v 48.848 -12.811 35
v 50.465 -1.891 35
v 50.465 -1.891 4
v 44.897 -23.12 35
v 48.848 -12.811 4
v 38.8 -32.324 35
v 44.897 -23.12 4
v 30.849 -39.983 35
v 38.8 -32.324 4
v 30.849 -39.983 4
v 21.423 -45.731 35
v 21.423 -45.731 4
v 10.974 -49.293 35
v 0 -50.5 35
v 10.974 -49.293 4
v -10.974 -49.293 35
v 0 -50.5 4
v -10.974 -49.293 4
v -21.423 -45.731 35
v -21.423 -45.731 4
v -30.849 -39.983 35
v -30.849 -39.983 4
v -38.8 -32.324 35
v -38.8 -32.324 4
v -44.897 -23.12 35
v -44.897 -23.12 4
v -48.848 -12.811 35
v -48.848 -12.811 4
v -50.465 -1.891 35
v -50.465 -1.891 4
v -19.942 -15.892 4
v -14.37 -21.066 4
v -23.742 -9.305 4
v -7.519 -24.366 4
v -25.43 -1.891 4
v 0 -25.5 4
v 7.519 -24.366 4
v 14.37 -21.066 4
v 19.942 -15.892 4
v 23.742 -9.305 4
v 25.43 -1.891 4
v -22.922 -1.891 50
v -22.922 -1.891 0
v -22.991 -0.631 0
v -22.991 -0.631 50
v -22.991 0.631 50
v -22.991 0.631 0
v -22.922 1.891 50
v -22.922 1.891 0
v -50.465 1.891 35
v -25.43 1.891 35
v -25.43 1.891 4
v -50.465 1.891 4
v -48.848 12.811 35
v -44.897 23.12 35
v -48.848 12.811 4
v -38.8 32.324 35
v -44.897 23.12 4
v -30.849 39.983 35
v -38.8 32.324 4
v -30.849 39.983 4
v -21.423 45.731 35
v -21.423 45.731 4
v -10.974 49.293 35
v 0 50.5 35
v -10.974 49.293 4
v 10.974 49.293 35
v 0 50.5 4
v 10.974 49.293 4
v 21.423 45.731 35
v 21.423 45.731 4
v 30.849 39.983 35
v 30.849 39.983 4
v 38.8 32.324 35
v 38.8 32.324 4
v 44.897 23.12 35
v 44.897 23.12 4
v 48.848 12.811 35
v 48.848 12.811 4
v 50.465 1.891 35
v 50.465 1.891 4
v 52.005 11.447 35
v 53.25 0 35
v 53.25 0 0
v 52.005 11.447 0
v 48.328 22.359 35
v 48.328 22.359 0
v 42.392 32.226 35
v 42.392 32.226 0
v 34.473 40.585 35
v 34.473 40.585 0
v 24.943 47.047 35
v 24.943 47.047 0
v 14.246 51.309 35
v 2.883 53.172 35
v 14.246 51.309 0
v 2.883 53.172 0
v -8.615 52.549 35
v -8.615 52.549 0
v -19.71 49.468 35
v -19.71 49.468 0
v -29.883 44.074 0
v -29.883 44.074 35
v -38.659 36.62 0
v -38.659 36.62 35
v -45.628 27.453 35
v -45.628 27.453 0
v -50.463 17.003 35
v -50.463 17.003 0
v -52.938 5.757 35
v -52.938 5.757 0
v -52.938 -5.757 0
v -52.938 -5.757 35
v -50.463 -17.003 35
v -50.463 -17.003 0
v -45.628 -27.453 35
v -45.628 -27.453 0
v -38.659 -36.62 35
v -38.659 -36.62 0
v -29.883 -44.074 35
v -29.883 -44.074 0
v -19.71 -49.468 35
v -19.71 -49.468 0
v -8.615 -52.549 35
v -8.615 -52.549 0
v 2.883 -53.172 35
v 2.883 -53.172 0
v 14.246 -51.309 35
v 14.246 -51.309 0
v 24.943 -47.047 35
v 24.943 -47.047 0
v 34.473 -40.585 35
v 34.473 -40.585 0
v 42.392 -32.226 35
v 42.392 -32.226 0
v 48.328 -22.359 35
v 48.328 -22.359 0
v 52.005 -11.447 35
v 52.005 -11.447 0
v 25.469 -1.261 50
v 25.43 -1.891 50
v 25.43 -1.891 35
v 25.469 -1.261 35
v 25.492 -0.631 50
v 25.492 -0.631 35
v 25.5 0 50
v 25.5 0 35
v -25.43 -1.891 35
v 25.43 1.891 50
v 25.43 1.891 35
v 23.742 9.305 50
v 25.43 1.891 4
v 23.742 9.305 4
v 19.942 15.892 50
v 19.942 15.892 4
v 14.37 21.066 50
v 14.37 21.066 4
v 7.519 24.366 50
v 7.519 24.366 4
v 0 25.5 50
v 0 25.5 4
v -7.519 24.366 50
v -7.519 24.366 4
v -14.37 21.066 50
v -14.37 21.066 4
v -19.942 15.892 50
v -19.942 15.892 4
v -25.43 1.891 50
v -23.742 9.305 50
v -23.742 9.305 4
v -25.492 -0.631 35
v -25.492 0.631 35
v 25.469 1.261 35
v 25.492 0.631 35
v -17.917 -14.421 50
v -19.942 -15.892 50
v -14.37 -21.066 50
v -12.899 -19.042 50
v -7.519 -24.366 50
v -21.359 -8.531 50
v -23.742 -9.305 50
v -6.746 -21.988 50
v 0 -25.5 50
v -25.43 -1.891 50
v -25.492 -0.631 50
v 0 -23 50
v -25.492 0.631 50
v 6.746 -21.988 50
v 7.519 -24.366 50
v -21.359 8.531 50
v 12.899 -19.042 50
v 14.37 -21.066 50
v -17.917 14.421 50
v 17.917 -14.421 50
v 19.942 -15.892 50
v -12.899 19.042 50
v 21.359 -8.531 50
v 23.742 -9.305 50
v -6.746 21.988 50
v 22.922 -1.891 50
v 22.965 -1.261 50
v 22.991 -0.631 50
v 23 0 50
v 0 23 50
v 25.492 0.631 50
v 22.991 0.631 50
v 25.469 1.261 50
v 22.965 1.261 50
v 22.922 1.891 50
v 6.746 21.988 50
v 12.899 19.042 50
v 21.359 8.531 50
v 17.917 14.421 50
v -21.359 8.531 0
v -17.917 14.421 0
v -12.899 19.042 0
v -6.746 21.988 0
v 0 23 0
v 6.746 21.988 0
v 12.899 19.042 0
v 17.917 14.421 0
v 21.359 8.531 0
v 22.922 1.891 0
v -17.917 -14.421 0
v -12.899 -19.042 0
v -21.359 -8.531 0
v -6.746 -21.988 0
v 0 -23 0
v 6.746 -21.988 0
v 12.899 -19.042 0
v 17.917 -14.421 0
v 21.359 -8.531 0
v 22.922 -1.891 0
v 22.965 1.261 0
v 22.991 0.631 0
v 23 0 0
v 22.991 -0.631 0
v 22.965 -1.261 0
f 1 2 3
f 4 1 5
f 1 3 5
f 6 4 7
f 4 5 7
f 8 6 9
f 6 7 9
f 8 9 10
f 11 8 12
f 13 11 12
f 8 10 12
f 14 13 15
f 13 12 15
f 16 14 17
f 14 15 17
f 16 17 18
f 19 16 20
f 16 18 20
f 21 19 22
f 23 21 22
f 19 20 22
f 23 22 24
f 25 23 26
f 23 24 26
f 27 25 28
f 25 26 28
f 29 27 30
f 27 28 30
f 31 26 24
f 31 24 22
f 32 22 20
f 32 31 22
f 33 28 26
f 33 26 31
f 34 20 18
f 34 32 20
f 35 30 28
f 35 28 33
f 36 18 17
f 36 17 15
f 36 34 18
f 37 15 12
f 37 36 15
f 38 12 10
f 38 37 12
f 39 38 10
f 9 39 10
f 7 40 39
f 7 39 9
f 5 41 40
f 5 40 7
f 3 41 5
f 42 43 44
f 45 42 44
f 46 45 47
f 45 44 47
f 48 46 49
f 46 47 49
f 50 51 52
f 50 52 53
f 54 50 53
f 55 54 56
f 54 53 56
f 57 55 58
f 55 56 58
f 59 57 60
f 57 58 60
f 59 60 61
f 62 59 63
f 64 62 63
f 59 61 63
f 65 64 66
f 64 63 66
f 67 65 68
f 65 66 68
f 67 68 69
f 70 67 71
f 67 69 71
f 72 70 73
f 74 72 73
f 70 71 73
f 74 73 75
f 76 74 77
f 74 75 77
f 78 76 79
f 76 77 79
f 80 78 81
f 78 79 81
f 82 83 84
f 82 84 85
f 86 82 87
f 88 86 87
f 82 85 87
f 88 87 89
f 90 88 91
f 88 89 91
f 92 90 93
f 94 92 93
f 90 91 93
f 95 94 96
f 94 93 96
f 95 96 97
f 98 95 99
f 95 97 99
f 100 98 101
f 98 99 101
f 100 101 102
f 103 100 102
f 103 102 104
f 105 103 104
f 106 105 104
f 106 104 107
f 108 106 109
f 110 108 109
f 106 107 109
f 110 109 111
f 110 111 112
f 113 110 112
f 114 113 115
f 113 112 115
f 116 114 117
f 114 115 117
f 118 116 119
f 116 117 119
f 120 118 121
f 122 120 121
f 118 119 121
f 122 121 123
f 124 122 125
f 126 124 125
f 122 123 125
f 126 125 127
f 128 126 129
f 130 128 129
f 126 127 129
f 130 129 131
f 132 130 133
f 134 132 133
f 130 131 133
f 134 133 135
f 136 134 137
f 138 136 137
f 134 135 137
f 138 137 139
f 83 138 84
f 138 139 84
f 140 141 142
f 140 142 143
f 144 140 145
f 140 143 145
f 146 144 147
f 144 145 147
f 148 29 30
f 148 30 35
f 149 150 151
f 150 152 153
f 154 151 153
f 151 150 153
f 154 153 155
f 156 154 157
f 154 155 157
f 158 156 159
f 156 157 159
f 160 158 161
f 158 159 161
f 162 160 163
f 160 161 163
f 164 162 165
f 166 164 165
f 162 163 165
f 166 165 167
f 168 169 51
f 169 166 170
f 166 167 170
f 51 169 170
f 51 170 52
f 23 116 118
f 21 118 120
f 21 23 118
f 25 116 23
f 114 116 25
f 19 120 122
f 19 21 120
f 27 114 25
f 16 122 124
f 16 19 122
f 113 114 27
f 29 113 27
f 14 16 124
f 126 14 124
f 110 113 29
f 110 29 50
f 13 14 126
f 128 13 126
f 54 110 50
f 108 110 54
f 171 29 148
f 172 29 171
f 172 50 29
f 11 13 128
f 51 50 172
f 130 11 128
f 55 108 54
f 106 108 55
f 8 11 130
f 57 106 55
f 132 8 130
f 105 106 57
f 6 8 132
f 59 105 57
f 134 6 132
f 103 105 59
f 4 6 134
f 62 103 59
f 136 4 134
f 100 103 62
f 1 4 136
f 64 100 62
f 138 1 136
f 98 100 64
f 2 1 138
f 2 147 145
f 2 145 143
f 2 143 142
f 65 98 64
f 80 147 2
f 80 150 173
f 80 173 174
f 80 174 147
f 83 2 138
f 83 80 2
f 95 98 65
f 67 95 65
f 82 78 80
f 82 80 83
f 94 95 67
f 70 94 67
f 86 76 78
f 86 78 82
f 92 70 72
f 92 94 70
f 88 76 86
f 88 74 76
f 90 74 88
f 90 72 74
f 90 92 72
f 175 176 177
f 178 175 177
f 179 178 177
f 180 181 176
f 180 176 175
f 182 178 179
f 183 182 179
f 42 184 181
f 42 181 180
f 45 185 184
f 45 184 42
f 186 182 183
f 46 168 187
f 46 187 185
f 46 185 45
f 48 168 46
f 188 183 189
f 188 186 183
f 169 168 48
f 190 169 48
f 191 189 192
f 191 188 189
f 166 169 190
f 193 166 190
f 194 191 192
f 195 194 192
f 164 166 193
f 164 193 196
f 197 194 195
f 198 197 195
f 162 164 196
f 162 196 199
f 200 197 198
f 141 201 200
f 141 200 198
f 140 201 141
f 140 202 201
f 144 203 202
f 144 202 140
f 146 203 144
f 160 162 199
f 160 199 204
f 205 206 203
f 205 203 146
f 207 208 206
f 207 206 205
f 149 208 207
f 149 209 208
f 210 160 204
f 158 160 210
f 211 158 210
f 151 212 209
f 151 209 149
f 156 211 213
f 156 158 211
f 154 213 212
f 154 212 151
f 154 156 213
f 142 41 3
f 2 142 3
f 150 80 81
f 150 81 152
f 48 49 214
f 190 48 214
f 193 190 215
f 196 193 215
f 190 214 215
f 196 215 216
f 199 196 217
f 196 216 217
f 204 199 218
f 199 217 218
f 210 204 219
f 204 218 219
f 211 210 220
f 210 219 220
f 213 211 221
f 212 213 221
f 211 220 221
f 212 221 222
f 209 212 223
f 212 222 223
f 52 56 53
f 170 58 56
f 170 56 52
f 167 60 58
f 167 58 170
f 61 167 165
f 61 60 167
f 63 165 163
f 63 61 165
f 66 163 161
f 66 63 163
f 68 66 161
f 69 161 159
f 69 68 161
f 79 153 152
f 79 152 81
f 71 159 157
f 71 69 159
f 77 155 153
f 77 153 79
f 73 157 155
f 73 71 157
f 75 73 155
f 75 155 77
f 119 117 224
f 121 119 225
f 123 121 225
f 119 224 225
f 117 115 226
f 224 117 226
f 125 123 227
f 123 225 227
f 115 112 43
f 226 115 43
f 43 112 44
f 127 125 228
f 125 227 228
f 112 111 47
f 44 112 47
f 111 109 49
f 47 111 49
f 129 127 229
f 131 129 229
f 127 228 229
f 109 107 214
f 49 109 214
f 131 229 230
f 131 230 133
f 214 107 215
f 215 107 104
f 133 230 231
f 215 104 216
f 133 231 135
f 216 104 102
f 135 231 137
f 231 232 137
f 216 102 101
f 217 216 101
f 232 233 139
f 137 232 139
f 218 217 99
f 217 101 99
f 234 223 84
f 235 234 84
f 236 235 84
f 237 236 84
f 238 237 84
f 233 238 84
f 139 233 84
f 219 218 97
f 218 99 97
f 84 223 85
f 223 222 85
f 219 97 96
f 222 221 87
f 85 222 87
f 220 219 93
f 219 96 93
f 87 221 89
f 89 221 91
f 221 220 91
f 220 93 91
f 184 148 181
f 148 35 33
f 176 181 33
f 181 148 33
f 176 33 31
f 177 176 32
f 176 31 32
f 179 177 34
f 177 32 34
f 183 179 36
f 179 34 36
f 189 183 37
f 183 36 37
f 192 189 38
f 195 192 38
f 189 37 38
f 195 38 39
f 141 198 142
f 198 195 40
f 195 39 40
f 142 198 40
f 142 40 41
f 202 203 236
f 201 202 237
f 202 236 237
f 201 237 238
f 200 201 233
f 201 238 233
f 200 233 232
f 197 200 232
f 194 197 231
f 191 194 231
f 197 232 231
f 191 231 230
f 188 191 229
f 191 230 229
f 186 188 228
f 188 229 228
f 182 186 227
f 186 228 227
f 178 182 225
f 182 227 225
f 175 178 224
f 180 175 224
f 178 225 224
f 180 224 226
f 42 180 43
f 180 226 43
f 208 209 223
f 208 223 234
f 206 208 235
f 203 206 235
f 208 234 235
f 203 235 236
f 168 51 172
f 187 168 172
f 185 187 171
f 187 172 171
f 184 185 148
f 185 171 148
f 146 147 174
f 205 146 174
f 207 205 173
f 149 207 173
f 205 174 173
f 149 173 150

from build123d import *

# Parameters (mm, degrees)
F0_R     = 53.25
F1_DEPTH = 35
F2_DEPTH = 4
F3_DEPTH = 50


with BuildPart() as f1:
    # F0 (on Top) → F1 (new body)
    with BuildSketch(Plane.XY):
        Circle(F0_R)
        with BuildLine():
            ThreePointArc((-50.4645979232, 1.8905968509), (0, 50.5), (50.4645979232, 1.8905968509))
            ThreePointArc((50.4645979232, 1.8905968509), (50.4911487051, 0.94546414), (50.5, 0))
            ThreePointArc((50.5, 0), (50.4911487051, -0.94546414), (50.4645979232, -1.8905968509))
            ThreePointArc((50.4645979232, -1.8905968509), (0, -50.5), (-50.4645979232, -1.8905968509))
            ThreePointArc((-50.4645979232, -1.8905968509), (-50.5, 0), (-50.4645979232, 1.8905968509))
        make_face(mode=Mode.SUBTRACT)
        with BuildLine():
            ThreePointArc((-25.4298180007, -1.8905968509), (-25.5, 0), (-25.4298180007, 1.8905968509))
            Line((-25.4298180007, 1.8905968509), (-50.4645979232, 1.8905968509))
            ThreePointArc((-50.4645979232, 1.8905968509), (-50.5, 0), (-50.4645979232, -1.8905968509))
            Line((-50.4645979232, -1.8905968509), (-25.4298180007, -1.8905968509))
        make_face()
        with BuildLine():
            Line((50.4645979232, 1.8905968509), (25.4298180007, 1.8905968509))
            ThreePointArc((25.4298180007, 1.8905968509), (25.4824484598, 0.9459495184), (25.5, 0))
            ThreePointArc((25.5, 0), (25.4824484598, -0.9459495184), (25.4298180007, -1.8905968509))
            Line((25.4298180007, -1.8905968509), (50.4645979232, -1.8905968509))
            ThreePointArc((50.4645979232, -1.8905968509), (50.4911487051, -0.94546414), (50.5, 0))
            ThreePointArc((50.5, 0), (50.4911487051, 0.94546414), (50.4645979232, 1.8905968509))
        make_face()
    extrude(amount=F1_DEPTH)

    # F0 (on Top) → F2 (join)
    with BuildSketch(Plane.XY):
        with BuildLine():
            ThreePointArc((-25.4298180007, 1.8905968509), (0, 25.5), (25.4298180007, 1.8905968509))
            Line((25.4298180007, 1.8905968509), (50.4645979232, 1.8905968509))
            ThreePointArc((50.4645979232, 1.8905968509), (0, 50.5), (-50.4645979232, 1.8905968509))
            Line((-50.4645979232, 1.8905968509), (-25.4298180007, 1.8905968509))
        make_face()
        with BuildLine():
            Line((50.4645979232, -1.8905968509), (25.4298180007, -1.8905968509))
            ThreePointArc((25.4298180007, -1.8905968509), (0, -25.5), (-25.4298180007, -1.8905968509))
            Line((-25.4298180007, -1.8905968509), (-50.4645979232, -1.8905968509))
            ThreePointArc((-50.4645979232, -1.8905968509), (0, -50.5), (50.4645979232, -1.8905968509))
        make_face()
    extrude(amount=F2_DEPTH)

    # F0 (on Top) → F3 (join)
    with BuildSketch(Plane.XY):
        with BuildLine():
            ThreePointArc((-22.9221648966, 1.8905968509), (0, 23), (22.9221648966, 1.8905968509))
            Line((22.9221648966, 1.8905968509), (25.4298180007, 1.8905968509))
            ThreePointArc((25.4298180007, 1.8905968509), (0, 25.5), (-25.4298180007, 1.8905968509))
            Line((-25.4298180007, 1.8905968509), (-22.9221648966, 1.8905968509))
        make_face()
        with BuildLine():
            Line((25.4298180007, -1.8905968509), (22.9221648966, -1.8905968509))
            ThreePointArc((22.9221648966, -1.8905968509), (0, -23), (-22.9221648966, -1.8905968509))
            Line((-22.9221648966, -1.8905968509), (-25.4298180007, -1.8905968509))
            ThreePointArc((-25.4298180007, -1.8905968509), (0, -25.5), (25.4298180007, -1.8905968509))
        make_face()
        with BuildLine():
            ThreePointArc((-22.9221648966, -1.8905968509), (-23, 0), (-22.9221648966, 1.8905968509))
            Line((-22.9221648966, 1.8905968509), (-25.4298180007, 1.8905968509))
            ThreePointArc((-25.4298180007, 1.8905968509), (-25.5, 0), (-25.4298180007, -1.8905968509))
            Line((-25.4298180007, -1.8905968509), (-22.9221648966, -1.8905968509))
        make_face()
        with BuildLine():
            ThreePointArc((22.9221648966, 1.8905968509), (22.9805329858, 0.9460991962), (23, 0))
            ThreePointArc((23, 0), (22.9805329858, -0.9460991962), (22.9221648966, -1.8905968509))
            Line((22.9221648966, -1.8905968509), (25.4298180007, -1.8905968509))
            ThreePointArc((25.4298180007, -1.8905968509), (25.4824484598, -0.9459495184), (25.5, 0))
            ThreePointArc((25.5, 0), (25.4824484598, 0.9459495184), (25.4298180007, 1.8905968509))
            Line((25.4298180007, 1.8905968509), (22.9221648966, 1.8905968509))
        make_face()
    extrude(amount=F3_DEPTH)


solid = f1.part
